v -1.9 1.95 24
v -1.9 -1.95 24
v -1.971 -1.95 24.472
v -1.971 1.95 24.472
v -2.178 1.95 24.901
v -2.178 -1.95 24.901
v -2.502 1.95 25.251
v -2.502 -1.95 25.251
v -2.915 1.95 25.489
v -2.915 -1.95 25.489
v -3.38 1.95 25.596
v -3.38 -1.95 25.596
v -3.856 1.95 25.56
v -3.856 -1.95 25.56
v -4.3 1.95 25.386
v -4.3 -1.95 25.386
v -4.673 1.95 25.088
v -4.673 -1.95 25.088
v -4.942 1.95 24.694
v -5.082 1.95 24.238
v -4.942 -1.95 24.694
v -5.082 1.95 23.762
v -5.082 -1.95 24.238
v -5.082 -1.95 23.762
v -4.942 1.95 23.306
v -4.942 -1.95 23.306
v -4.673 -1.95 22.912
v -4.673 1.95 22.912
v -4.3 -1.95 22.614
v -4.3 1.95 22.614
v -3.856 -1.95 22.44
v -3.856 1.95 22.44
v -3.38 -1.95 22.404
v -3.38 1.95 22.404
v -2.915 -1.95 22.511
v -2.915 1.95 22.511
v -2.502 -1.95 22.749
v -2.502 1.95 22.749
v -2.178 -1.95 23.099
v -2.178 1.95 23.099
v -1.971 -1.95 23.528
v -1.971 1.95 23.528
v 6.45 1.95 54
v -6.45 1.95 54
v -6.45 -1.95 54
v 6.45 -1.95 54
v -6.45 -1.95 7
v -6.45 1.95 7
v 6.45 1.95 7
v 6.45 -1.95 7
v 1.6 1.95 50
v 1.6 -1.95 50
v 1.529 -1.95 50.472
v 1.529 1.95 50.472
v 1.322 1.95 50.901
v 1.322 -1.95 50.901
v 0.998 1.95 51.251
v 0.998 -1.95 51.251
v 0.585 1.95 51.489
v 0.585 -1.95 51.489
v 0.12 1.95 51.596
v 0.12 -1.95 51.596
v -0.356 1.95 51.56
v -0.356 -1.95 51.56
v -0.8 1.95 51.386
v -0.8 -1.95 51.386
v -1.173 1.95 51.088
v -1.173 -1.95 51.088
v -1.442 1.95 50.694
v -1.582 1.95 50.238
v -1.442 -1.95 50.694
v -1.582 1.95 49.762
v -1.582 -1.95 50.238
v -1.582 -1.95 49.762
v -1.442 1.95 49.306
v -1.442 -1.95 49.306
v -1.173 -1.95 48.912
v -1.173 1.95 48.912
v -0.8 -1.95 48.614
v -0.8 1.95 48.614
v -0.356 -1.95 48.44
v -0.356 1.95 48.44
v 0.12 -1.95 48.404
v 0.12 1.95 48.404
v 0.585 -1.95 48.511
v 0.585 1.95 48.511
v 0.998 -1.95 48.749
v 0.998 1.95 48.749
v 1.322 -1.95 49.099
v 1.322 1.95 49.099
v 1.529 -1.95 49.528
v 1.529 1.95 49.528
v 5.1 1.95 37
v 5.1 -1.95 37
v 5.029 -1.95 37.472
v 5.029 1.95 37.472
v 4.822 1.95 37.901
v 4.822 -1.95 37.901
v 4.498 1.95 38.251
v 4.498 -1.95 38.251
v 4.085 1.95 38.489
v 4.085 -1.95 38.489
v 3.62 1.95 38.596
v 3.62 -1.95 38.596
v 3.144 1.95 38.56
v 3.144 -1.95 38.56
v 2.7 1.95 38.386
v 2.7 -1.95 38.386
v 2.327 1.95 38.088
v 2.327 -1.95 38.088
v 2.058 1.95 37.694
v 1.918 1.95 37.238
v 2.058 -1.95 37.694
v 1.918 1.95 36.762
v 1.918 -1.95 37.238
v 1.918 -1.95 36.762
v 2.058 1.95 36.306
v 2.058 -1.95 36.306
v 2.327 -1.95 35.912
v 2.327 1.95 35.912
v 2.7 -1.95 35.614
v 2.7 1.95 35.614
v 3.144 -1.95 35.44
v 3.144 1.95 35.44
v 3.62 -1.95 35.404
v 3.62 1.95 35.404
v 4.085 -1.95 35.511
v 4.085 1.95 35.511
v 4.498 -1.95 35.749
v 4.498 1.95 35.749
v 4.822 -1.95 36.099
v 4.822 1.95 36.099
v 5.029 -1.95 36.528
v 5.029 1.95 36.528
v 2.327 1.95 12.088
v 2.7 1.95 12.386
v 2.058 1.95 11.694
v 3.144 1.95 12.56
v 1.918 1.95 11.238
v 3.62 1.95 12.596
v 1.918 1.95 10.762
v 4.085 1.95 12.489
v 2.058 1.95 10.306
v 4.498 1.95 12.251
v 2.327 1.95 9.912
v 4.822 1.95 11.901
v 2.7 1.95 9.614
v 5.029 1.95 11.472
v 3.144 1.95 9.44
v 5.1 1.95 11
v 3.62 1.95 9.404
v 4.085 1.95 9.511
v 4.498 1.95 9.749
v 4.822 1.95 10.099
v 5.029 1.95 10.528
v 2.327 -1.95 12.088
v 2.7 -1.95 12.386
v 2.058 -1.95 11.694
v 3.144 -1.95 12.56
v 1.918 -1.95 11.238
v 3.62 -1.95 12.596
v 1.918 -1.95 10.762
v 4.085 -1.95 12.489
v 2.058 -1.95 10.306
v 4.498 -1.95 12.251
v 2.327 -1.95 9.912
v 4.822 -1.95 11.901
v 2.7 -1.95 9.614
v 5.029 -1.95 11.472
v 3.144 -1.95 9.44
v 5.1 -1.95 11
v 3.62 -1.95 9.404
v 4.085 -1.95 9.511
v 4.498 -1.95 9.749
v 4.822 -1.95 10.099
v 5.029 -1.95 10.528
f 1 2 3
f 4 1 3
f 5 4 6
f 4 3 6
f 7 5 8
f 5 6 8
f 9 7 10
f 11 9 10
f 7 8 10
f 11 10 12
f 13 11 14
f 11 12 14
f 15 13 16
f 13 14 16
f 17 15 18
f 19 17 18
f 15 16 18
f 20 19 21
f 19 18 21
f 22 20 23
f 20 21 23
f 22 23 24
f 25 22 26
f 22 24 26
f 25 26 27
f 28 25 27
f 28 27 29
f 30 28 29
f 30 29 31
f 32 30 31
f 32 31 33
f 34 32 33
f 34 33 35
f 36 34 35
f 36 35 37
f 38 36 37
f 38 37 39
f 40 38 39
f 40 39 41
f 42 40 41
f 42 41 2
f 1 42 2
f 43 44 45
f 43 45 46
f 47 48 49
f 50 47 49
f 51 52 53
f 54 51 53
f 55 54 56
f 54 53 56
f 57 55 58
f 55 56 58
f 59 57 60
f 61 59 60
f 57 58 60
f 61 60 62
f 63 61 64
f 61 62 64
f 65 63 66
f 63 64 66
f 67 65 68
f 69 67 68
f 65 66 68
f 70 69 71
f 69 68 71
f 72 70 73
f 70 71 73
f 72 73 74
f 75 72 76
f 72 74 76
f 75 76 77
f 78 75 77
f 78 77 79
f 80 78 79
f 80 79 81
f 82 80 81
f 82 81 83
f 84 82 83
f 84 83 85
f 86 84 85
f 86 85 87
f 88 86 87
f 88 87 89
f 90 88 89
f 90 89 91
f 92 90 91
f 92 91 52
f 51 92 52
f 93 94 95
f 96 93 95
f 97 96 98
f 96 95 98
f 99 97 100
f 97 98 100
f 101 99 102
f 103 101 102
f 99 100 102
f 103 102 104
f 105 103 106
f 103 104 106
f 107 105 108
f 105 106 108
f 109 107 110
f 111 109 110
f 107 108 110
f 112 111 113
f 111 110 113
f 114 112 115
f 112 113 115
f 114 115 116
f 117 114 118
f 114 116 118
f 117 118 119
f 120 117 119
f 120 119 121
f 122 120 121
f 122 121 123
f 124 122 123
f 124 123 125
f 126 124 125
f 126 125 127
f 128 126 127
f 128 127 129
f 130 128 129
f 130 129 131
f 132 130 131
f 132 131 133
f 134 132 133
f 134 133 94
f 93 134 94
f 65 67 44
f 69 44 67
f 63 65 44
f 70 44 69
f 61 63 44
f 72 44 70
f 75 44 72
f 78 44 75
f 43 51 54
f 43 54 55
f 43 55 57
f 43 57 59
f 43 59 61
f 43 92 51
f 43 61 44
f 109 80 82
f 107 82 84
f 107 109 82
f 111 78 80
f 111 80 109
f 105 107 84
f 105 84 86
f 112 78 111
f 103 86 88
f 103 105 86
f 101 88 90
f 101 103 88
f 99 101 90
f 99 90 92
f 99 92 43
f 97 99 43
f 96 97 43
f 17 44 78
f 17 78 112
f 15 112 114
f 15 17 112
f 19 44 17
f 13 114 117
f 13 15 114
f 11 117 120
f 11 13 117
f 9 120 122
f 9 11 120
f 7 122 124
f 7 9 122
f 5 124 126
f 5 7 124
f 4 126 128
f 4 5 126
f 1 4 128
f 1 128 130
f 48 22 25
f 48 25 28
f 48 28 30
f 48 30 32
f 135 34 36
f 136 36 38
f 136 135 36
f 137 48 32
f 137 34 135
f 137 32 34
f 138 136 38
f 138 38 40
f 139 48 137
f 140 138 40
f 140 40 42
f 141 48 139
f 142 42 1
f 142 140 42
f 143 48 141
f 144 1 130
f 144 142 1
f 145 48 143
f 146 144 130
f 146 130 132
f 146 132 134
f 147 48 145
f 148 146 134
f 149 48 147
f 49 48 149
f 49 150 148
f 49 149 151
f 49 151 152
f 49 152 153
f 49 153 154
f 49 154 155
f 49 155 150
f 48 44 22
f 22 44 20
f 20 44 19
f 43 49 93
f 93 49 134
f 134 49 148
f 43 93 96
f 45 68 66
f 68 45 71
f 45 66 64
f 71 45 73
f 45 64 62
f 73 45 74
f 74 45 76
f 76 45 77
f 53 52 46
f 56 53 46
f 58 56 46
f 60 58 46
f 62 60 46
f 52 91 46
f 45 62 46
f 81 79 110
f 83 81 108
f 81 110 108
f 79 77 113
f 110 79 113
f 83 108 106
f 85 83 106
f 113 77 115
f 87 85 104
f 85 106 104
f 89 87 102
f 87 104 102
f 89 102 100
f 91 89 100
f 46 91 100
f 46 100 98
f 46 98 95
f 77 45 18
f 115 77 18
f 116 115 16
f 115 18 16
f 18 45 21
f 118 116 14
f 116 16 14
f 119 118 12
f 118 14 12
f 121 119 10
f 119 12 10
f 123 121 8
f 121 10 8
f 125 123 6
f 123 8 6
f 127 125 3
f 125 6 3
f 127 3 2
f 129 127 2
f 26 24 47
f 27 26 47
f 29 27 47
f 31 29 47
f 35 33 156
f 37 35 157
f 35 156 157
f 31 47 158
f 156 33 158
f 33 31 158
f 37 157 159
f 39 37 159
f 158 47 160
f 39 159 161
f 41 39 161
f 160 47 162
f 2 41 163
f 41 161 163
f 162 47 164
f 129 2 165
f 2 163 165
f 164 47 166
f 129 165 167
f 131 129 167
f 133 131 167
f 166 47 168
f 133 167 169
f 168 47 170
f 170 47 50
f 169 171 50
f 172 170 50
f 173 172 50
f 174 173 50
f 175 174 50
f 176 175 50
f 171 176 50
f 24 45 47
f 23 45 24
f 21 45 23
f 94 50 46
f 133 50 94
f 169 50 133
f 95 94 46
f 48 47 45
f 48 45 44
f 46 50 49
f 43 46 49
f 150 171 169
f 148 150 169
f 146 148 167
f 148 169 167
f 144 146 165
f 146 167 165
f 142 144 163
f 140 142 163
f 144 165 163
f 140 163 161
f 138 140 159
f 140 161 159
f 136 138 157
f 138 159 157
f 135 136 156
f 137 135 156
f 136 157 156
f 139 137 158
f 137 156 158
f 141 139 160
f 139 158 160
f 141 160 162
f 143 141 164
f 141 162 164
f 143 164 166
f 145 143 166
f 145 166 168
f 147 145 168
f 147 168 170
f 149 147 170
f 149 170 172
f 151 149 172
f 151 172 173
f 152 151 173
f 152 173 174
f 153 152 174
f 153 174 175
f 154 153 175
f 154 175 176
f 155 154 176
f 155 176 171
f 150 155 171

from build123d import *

# Parameters (mm, degrees)
SKETCH_1_W          = 7.5
SKETCH_1_H          = 6
EXTRUDE_1_DEPTH     = 2
SKETCH_2_W          = 12.9
SKETCH_2_H          = 3.9
EXTRUDE_2_DEPTH     = 52
SKETCH_3_R          = 1.6
CUT_EXTRUDE_1_DEPTH = 356
SKETCH_4_W          = 7.5
SKETCH_4_H          = 1.05
CUT_EXTRUDE_2_DEPTH = 10
SKETCH_5_W          = 22.28550744
SKETCH_5_H          = 23.147494016
CUT_EXTRUDE_3_DEPTH = 10


with BuildPart() as part:
    # 草图1 → 凸台-拉伸1 (new body)
    with BuildSketch(Plane.XY):
        with Locations((3.75, 0)):
            Rectangle(SKETCH_1_W, SKETCH_1_H)
    extrude(amount=EXTRUDE_1_DEPTH)

    # 草图2 → 凸台-拉伸2 (add)
    with BuildSketch(Plane.XY.offset(2)):
        Rectangle(SKETCH_2_W, SKETCH_2_H)
    extrude(amount=EXTRUDE_2_DEPTH)

    # 草图3 → 切除-拉伸1 (cut)
    with BuildSketch(Plane.XZ.offset(1.95)):
        with Locations((3.5, 37)):
            Circle(SKETCH_3_R)
        with Locations((3.5, 11)):
            Circle(SKETCH_3_R)
        with Locations((-3.5, 24)):
            Circle(SKETCH_3_R)
        with Locations((0, 50)):
            Circle(SKETCH_3_R)
    extrude(amount=-CUT_EXTRUDE_1_DEPTH, mode=Mode.SUBTRACT)

    # 草图4 → 切除-拉伸2 (cut)
    with BuildSketch(Plane.XY.offset(2)):
        with Locations((3.75, 2.475)):
            Rectangle(SKETCH_4_W, SKETCH_4_H)
    extrude(amount=-CUT_EXTRUDE_2_DEPTH, mode=Mode.SUBTRACT)

    # 草图5 → 切除-拉伸3 (cut)
    with BuildSketch(Plane(origin=(0, 1.95, 0), x_dir=(1, 0, 0), z_dir=(0, 1, 0))):
        with Locations((0, 4.573747008)):
            Rectangle(SKETCH_5_W, SKETCH_5_H)
    extrude(amount=-CUT_EXTRUDE_3_DEPTH, mode=Mode.SUBTRACT)


solid = part.part
